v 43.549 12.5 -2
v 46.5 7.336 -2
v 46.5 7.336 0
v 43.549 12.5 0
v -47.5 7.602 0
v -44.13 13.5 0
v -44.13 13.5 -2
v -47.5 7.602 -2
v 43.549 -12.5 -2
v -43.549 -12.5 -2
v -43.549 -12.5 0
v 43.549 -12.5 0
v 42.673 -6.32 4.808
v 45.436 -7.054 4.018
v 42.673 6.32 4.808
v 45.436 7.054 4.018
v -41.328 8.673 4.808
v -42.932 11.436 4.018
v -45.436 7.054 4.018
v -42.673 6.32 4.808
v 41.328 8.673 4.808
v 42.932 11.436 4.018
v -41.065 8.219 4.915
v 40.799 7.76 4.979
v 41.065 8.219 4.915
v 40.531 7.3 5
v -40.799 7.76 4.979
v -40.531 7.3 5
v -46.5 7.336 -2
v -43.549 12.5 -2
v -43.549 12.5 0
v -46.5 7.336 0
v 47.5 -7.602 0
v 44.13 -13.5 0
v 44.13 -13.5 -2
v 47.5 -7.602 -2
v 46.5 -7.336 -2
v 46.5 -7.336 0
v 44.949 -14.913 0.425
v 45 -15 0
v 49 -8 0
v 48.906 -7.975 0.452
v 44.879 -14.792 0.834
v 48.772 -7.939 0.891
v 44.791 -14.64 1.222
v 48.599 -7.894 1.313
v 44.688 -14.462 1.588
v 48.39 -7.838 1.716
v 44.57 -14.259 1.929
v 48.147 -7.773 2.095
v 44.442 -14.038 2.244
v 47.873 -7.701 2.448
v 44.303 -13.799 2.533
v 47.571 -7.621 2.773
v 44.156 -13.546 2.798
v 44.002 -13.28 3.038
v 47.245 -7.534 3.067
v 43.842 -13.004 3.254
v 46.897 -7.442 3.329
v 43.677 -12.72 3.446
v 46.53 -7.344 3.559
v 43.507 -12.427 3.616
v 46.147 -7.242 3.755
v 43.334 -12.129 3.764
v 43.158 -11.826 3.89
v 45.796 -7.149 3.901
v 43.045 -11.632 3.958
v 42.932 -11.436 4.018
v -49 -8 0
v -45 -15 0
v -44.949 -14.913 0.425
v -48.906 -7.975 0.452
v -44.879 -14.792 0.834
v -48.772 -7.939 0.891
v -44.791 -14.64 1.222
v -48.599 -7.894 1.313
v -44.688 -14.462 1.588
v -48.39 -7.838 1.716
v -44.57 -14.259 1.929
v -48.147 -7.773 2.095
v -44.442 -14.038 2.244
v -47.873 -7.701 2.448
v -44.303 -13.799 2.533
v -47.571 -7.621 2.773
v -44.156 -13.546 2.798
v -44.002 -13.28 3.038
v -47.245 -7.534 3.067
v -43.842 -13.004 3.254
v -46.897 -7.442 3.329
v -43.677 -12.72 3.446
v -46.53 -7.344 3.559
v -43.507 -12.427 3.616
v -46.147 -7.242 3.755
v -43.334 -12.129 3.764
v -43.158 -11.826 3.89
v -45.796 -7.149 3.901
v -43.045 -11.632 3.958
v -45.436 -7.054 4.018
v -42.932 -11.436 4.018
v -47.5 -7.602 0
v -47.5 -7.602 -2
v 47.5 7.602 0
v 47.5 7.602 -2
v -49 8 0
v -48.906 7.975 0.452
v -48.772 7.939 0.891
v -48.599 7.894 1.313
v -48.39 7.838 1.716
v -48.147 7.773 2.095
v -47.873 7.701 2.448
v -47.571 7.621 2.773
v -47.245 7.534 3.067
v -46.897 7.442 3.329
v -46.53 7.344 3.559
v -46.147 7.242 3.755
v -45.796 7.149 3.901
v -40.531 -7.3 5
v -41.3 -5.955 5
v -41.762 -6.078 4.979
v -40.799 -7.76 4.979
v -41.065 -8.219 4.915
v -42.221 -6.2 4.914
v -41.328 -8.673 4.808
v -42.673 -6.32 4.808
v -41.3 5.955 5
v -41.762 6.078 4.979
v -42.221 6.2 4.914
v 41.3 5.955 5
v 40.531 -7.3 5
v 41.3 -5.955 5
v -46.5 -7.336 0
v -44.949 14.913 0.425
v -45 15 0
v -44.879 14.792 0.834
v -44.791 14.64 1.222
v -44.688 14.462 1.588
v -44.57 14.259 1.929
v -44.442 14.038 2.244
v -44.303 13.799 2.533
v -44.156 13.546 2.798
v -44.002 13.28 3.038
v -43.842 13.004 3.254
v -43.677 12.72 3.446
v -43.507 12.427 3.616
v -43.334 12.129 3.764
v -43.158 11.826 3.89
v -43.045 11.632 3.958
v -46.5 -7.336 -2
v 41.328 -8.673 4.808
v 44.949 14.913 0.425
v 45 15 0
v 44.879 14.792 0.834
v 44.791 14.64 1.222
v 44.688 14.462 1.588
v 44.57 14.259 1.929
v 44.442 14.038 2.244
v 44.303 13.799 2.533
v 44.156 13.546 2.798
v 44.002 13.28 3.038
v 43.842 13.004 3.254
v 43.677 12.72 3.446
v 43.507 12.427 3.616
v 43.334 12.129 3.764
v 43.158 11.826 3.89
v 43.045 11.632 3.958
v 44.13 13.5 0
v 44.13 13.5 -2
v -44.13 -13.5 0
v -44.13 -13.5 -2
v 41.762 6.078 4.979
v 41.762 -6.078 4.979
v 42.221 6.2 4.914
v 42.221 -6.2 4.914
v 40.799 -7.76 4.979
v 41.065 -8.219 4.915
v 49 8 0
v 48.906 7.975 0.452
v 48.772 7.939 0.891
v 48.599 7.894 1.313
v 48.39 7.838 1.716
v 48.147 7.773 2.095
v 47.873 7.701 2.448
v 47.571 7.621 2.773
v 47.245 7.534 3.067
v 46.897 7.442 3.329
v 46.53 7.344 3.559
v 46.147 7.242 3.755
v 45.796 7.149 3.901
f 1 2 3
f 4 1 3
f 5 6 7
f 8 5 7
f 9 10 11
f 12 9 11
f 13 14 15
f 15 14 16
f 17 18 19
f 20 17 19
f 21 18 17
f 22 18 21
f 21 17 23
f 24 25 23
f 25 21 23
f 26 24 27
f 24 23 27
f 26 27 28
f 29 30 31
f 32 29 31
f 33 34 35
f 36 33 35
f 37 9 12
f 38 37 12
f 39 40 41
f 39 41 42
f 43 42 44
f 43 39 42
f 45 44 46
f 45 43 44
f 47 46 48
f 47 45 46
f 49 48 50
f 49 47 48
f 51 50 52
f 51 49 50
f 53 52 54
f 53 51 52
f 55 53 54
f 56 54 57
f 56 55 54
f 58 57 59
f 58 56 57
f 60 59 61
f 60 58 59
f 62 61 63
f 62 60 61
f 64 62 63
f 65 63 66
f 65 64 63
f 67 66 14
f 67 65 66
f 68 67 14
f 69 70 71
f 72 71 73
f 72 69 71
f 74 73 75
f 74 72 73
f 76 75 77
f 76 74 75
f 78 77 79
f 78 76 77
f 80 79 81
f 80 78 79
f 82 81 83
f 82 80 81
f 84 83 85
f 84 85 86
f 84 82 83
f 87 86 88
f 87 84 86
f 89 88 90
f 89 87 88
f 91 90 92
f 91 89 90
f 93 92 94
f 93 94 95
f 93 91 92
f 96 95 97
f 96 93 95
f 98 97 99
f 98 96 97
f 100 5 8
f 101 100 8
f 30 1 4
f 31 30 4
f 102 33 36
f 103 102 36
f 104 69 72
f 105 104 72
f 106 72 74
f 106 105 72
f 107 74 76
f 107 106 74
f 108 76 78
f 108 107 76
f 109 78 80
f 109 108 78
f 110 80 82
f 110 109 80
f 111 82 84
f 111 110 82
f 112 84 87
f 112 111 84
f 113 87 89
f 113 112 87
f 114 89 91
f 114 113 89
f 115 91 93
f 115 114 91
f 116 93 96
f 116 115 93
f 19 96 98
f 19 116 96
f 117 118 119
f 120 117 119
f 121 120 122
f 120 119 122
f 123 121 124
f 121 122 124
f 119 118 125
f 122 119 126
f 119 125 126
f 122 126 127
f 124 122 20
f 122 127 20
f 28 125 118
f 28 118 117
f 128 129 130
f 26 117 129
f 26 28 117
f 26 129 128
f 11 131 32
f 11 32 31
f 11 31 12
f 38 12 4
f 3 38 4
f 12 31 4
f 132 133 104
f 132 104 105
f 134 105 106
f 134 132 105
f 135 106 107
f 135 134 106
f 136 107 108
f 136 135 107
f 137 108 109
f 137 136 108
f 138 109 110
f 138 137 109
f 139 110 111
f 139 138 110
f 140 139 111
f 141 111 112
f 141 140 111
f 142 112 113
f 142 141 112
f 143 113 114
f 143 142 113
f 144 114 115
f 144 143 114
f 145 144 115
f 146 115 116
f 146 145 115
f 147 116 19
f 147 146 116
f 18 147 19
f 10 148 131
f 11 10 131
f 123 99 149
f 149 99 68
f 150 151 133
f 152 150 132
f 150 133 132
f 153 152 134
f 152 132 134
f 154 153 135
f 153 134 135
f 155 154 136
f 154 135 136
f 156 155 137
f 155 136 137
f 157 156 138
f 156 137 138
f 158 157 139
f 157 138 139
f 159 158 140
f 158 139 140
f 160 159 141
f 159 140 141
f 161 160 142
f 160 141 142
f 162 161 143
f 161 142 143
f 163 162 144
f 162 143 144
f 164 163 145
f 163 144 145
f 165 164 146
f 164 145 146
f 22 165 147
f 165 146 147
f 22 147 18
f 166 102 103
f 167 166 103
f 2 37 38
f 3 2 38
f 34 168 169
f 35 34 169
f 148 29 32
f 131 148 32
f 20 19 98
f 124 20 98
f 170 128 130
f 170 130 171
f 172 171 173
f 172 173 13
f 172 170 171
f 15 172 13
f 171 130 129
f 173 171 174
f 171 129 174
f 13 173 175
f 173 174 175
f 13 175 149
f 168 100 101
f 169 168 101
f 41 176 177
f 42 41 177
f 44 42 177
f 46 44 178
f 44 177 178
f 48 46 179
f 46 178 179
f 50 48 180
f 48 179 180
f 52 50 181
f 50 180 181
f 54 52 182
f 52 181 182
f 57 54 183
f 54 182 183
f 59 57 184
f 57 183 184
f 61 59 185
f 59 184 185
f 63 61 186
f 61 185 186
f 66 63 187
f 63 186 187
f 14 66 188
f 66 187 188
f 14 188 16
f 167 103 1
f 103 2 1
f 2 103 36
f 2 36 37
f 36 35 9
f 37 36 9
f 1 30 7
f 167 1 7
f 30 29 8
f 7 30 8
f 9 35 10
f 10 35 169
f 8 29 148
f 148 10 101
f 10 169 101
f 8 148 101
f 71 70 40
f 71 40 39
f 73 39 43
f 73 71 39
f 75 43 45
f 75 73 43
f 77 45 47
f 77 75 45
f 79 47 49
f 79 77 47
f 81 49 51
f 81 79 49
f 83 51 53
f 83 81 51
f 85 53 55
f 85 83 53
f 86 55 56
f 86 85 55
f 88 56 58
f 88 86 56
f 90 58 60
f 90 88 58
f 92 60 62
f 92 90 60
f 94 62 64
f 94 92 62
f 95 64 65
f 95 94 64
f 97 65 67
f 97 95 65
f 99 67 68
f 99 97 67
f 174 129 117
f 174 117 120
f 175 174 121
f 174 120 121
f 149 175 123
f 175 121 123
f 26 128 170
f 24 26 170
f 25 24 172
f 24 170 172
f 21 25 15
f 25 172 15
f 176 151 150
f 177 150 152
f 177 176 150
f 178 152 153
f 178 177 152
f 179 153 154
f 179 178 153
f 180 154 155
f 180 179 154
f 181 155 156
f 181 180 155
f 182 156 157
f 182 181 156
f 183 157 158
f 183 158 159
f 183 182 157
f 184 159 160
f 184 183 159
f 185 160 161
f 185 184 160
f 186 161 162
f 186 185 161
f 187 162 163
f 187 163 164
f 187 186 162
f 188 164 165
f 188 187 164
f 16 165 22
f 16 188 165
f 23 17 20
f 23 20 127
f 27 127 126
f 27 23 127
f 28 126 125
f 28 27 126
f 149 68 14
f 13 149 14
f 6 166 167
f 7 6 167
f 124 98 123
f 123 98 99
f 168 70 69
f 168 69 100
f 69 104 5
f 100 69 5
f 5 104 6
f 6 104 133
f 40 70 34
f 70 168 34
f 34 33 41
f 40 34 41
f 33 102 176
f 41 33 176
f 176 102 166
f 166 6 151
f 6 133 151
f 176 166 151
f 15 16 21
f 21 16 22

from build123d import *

# Parameters (mm, degrees)
F0_W         = 90
F0_H         = 30
F1_DEPTH     = 5
F2_W         = 1
F2_H         = 2
F4_SIZE2     = 2
F4_SIZE      = 7
F5_T1_DEPTH  = 121.5034235835
F5_T3_DEPTH  = 85.3768581194
F5_T5_DEPTH  = 51.611107996
F5_T7_DEPTH  = 15.783471497
F5_T9_DEPTH  = 71.594276912
F5_T11_DEPTH = 5.6424225565
F5_T13_DEPTH = 51.611107996
F5_T15_DEPTH = 5.6424225565
F5_T17_DEPTH = 51.611107996
F5_T19_DEPTH = 5.6424225565
F5_T21_DEPTH = 5.6424225565
F5_T23_DEPTH = 51.611107996


# Not quite as in the source:
# - a fillet or chamfer that OpenCascade refuses, or shapes differently, is made with other operations: its cross-section is extruded or revolved along the edge and cut away or added


with BuildPart() as f1:
    # F0 (on Top) → F1 (new body)
    with BuildSketch(Plane.XY):
        Polygon((-45, -15), (-45, 15), (-49, 8), (-49, -8), align=None)
        Polygon((49, 8), (45, 15), (45, -15), (49, -8), align=None)
        Rectangle(F0_W, F0_H)
    extrude(amount=F1_DEPTH)

    # F3: sweep along a path in F3_path
    with BuildLine(Plane(origin=(45, -15, 0), x_dir=(0, -1, 0), z_dir=(0, 0, -1))) as f3_path:
        Line((0, 0), (0, 90))
        Line((0, 90), (-7, 94))
        Line((-7, 94), (-23, 94))
        Line((-23, 94), (-30, 90))
        Line((-30, 90), (-30, 0))
        Line((-30, 0), (-23, -4))
        Line((-23, -4), (-7, -4))
        Line((-7, -4), (0, 0))
    # F2 (on Right) → F3 (sweep)
    with BuildSketch(Plane.YZ):
        with Locations((-13, -1)):
            Rectangle(F2_W, F2_H)
    sweep(path=f3_path.line, transition=Transition.RIGHT)

    # F4
    f4_edges = [f1.edges().sort_by_distance(p)[0] for p in [
        (-49, 0, 5),
        (-47, -11.5, 5),
        (-47, 11.5, 5),
        (47, -11.5, 5),
        (49, 0, 5),
        (47, 11.5, 5),
        (0, -15, 5),
        (0, 15, 5),
    ]]
    f4_side = f1.faces().sort_by_distance((0, 0, 5))[0]
    chamfer(f4_edges, length=F4_SIZE, length2=F4_SIZE2, reference=f4_side)

    # F5: fillet of radius 5 on 16 edges, made by hand

    # F5_s2 → F5_t1 (cut)
    with BuildSketch(Plane.YZ.offset(-60.7517117917)):
        with BuildLine():
            ThreePointArc((15, 0), (13.8034764966, 2.5282074371), (11.4363180932, 4.0181948305))
            Line((11.4363180932, 4.0181948305), (15, 3))
            Line((15, 3), (15, 0))
        make_face()
        with BuildLine():
            ThreePointArc((-15, 0), (-13.8034764966, 2.5282074371), (-11.4363180932, 4.0181948305))
            Line((-11.4363180932, 4.0181948305), (-15, 3))
            Line((-15, 3), (-15, 0))
        make_face()
    extrude(amount=F5_T1_DEPTH, mode=Mode.SUBTRACT)

    # F5_s4 → F5_t3 (cut)
    with BuildSketch(Plane.YZ.offset(-42.6884290597)):
        with BuildLine():
            ThreePointArc((8.6733309163, 4.8076197382), (7.9932313362, 4.9516713689), (7.2997252768, 5))
            Line((7.2997252768, 5), (8, 5))
            Line((8, 5), (8.6733309163, 4.8076197382))
        make_face()
        with BuildLine():
            ThreePointArc((-7.2997252768, 5), (-7.9932313362, 4.9516713689), (-8.6733309163, 4.8076197382))
            Line((-8.6733309163, 4.8076197382), (-8, 5))
            Line((-8, 5), (-7.2997252768, 5))
        make_face()
    extrude(amount=F5_T3_DEPTH, mode=Mode.SUBTRACT)

    # F5_s6 → F5_t5 (cut)
    with BuildSketch(Plane(origin=(-22.4066273783, 39.211597912, 0), x_dir=(0, 0, 1), z_dir=(0.4961389384, -0.8682431421, 0))):
        with BuildLine():
            ThreePointArc((0, 46.513025471), (2.5282074371, 45.3165019675), (4.0181948305, 42.9493435641))
            Line((4.0181948305, 42.9493435641), (3, 46.513025471))
            Line((3, 46.513025471), (0, 46.513025471))
        make_face()
    extrude(amount=F5_T5_DEPTH, mode=Mode.SUBTRACT)

    # F5_s8 → F5_t7 (cut)
    with BuildSketch(Plane.XZ.offset(-7.8917357485)):
        with BuildLine():
            ThreePointArc((-41.2997252768, 5), (-41.9932313362, 4.9516713689), (-42.6733309163, 4.8076197382))
            Line((-42.6733309163, 4.8076197382), (-42, 5))
            Line((-42, 5), (-41.2997252768, 5))
        make_face()
        with BuildLine():
            ThreePointArc((41.2997252768, 5), (41.9932313362, 4.9516713689), (42.6733309163, 4.8076197382))
            Line((42.6733309163, 4.8076197382), (42, 5))
            Line((42, 5), (41.2997252768, 5))
        make_face()
    extrude(amount=F5_T7_DEPTH, mode=Mode.SUBTRACT)

    # F5_s10 → F5_t9 (cut)
    with BuildSketch(Plane.XZ.offset(-35.797138456)):
        with BuildLine():
            ThreePointArc((-49, 0), (-47.8034764966, 2.5282074371), (-45.4363180932, 4.0181948305))
            Line((-45.4363180932, 4.0181948305), (-49, 3))
            Line((-49, 3), (-49, 0))
        make_face()
        with BuildLine():
            ThreePointArc((49, 0), (47.8034764966, 2.5282074371), (45.4363180932, 4.0181948305))
            Line((45.4363180932, 4.0181948305), (49, 3))
            Line((49, 3), (49, 0))
        make_face()
    extrude(amount=F5_T9_DEPTH, mode=Mode.SUBTRACT)

    # F5_s12 → F5_t11 (cut)
    with BuildSketch(Plane(origin=(-8.5616705046, 14.982923383, 0), x_dir=(0, 0, 1), z_dir=(0.4961389384, -0.8682431421, 0))):
        with BuildLine():
            ThreePointArc((5, 38.8127507478), (4.9516713689, 39.5062568072), (4.8076197382, 40.1863563872))
            Line((4.8076197382, 40.1863563872), (5, 39.513025471))
            Line((5, 39.513025471), (5, 38.8127507478))
        make_face()
    extrude(amount=F5_T11_DEPTH, mode=Mode.SUBTRACT)

    # F5_s14 → F5_t13 (cut)
    with BuildSketch(Plane(origin=(3.1996529503, 5.599392663, 0), x_dir=(0, 0, 1), z_dir=(-0.4961389384, -0.8682431421, 0))):
        with BuildLine():
            ThreePointArc((0, 46.513025471), (2.5282074371, 45.3165019675), (4.0181948305, 42.9493435641))
            Line((4.0181948305, 42.9493435641), (3, 46.513025471))
            Line((3, 46.513025471), (0, 46.513025471))
        make_face()
    extrude(amount=F5_T13_DEPTH, mode=Mode.SUBTRACT)

    # F5_s16 → F5_t15 (cut)
    with BuildSketch(Plane(origin=(-5.7622449676, -10.0839286934, 0), x_dir=(0, 0, 1), z_dir=(-0.4961389384, -0.8682431421, 0))):
        with BuildLine():
            ThreePointArc((4.8076197382, 40.1863563872), (4.9516713689, 39.5062568072), (5, 38.8127507478))
            Line((5, 38.8127507478), (5, 39.513025471))
            Line((5, 39.513025471), (4.8076197382, 40.1863563872))
        make_face()
    extrude(amount=F5_T15_DEPTH, mode=Mode.SUBTRACT)

    # F5_s18 → F5_t17 (cut)
    with BuildSketch(Plane(origin=(22.4066273783, -39.211597912, 0), x_dir=(0, 0, 1), z_dir=(-0.4961389384, 0.8682431421, 0))):
        with BuildLine():
            ThreePointArc((0, 46.513025471), (2.5282074371, 45.3165019675), (4.0181948305, 42.9493435641))
            Line((4.0181948305, 42.9493435641), (3, 46.513025471))
            Line((3, 46.513025471), (0, 46.513025471))
        make_face()
    extrude(amount=F5_T17_DEPTH, mode=Mode.SUBTRACT)

    # F5_s20 → F5_t19 (cut)
    with BuildSketch(Plane(origin=(8.5616705046, -14.982923383, 0), x_dir=(0, 0, 1), z_dir=(-0.4961389384, 0.8682431421, 0))):
        with BuildLine():
            ThreePointArc((5, 38.8127507478), (4.9516713689, 39.5062568072), (4.8076197382, 40.1863563872))
            Line((4.8076197382, 40.1863563872), (5, 39.513025471))
            Line((5, 39.513025471), (5, 38.8127507478))
        make_face()
    extrude(amount=F5_T19_DEPTH, mode=Mode.SUBTRACT)

    # F5_s22 → F5_t21 (cut)
    with BuildSketch(Plane(origin=(5.7622449676, 10.0839286934, 0), x_dir=(0, 0, 1), z_dir=(0.4961389384, 0.8682431421, 0))):
        with BuildLine():
            ThreePointArc((5, 38.8127507478), (4.9516713689, 39.5062568072), (4.8076197382, 40.1863563872))
            Line((4.8076197382, 40.1863563872), (5, 39.513025471))
            Line((5, 39.513025471), (5, 38.8127507478))
        make_face()
    extrude(amount=F5_T21_DEPTH, mode=Mode.SUBTRACT)

    # F5_s24 → F5_t23 (cut)
    with BuildSketch(Plane(origin=(-3.1996529503, -5.599392663, 0), x_dir=(0, 0, 1), z_dir=(0.4961389384, 0.8682431421, 0))):
        with BuildLine():
            ThreePointArc((0, 46.513025471), (2.5282074371, 45.3165019675), (4.0181948305, 42.9493435641))
            Line((4.0181948305, 42.9493435641), (3, 46.513025471))
            Line((3, 46.513025471), (0, 46.513025471))
        make_face()
    extrude(amount=F5_T23_DEPTH, mode=Mode.SUBTRACT)


solid = f1.part
